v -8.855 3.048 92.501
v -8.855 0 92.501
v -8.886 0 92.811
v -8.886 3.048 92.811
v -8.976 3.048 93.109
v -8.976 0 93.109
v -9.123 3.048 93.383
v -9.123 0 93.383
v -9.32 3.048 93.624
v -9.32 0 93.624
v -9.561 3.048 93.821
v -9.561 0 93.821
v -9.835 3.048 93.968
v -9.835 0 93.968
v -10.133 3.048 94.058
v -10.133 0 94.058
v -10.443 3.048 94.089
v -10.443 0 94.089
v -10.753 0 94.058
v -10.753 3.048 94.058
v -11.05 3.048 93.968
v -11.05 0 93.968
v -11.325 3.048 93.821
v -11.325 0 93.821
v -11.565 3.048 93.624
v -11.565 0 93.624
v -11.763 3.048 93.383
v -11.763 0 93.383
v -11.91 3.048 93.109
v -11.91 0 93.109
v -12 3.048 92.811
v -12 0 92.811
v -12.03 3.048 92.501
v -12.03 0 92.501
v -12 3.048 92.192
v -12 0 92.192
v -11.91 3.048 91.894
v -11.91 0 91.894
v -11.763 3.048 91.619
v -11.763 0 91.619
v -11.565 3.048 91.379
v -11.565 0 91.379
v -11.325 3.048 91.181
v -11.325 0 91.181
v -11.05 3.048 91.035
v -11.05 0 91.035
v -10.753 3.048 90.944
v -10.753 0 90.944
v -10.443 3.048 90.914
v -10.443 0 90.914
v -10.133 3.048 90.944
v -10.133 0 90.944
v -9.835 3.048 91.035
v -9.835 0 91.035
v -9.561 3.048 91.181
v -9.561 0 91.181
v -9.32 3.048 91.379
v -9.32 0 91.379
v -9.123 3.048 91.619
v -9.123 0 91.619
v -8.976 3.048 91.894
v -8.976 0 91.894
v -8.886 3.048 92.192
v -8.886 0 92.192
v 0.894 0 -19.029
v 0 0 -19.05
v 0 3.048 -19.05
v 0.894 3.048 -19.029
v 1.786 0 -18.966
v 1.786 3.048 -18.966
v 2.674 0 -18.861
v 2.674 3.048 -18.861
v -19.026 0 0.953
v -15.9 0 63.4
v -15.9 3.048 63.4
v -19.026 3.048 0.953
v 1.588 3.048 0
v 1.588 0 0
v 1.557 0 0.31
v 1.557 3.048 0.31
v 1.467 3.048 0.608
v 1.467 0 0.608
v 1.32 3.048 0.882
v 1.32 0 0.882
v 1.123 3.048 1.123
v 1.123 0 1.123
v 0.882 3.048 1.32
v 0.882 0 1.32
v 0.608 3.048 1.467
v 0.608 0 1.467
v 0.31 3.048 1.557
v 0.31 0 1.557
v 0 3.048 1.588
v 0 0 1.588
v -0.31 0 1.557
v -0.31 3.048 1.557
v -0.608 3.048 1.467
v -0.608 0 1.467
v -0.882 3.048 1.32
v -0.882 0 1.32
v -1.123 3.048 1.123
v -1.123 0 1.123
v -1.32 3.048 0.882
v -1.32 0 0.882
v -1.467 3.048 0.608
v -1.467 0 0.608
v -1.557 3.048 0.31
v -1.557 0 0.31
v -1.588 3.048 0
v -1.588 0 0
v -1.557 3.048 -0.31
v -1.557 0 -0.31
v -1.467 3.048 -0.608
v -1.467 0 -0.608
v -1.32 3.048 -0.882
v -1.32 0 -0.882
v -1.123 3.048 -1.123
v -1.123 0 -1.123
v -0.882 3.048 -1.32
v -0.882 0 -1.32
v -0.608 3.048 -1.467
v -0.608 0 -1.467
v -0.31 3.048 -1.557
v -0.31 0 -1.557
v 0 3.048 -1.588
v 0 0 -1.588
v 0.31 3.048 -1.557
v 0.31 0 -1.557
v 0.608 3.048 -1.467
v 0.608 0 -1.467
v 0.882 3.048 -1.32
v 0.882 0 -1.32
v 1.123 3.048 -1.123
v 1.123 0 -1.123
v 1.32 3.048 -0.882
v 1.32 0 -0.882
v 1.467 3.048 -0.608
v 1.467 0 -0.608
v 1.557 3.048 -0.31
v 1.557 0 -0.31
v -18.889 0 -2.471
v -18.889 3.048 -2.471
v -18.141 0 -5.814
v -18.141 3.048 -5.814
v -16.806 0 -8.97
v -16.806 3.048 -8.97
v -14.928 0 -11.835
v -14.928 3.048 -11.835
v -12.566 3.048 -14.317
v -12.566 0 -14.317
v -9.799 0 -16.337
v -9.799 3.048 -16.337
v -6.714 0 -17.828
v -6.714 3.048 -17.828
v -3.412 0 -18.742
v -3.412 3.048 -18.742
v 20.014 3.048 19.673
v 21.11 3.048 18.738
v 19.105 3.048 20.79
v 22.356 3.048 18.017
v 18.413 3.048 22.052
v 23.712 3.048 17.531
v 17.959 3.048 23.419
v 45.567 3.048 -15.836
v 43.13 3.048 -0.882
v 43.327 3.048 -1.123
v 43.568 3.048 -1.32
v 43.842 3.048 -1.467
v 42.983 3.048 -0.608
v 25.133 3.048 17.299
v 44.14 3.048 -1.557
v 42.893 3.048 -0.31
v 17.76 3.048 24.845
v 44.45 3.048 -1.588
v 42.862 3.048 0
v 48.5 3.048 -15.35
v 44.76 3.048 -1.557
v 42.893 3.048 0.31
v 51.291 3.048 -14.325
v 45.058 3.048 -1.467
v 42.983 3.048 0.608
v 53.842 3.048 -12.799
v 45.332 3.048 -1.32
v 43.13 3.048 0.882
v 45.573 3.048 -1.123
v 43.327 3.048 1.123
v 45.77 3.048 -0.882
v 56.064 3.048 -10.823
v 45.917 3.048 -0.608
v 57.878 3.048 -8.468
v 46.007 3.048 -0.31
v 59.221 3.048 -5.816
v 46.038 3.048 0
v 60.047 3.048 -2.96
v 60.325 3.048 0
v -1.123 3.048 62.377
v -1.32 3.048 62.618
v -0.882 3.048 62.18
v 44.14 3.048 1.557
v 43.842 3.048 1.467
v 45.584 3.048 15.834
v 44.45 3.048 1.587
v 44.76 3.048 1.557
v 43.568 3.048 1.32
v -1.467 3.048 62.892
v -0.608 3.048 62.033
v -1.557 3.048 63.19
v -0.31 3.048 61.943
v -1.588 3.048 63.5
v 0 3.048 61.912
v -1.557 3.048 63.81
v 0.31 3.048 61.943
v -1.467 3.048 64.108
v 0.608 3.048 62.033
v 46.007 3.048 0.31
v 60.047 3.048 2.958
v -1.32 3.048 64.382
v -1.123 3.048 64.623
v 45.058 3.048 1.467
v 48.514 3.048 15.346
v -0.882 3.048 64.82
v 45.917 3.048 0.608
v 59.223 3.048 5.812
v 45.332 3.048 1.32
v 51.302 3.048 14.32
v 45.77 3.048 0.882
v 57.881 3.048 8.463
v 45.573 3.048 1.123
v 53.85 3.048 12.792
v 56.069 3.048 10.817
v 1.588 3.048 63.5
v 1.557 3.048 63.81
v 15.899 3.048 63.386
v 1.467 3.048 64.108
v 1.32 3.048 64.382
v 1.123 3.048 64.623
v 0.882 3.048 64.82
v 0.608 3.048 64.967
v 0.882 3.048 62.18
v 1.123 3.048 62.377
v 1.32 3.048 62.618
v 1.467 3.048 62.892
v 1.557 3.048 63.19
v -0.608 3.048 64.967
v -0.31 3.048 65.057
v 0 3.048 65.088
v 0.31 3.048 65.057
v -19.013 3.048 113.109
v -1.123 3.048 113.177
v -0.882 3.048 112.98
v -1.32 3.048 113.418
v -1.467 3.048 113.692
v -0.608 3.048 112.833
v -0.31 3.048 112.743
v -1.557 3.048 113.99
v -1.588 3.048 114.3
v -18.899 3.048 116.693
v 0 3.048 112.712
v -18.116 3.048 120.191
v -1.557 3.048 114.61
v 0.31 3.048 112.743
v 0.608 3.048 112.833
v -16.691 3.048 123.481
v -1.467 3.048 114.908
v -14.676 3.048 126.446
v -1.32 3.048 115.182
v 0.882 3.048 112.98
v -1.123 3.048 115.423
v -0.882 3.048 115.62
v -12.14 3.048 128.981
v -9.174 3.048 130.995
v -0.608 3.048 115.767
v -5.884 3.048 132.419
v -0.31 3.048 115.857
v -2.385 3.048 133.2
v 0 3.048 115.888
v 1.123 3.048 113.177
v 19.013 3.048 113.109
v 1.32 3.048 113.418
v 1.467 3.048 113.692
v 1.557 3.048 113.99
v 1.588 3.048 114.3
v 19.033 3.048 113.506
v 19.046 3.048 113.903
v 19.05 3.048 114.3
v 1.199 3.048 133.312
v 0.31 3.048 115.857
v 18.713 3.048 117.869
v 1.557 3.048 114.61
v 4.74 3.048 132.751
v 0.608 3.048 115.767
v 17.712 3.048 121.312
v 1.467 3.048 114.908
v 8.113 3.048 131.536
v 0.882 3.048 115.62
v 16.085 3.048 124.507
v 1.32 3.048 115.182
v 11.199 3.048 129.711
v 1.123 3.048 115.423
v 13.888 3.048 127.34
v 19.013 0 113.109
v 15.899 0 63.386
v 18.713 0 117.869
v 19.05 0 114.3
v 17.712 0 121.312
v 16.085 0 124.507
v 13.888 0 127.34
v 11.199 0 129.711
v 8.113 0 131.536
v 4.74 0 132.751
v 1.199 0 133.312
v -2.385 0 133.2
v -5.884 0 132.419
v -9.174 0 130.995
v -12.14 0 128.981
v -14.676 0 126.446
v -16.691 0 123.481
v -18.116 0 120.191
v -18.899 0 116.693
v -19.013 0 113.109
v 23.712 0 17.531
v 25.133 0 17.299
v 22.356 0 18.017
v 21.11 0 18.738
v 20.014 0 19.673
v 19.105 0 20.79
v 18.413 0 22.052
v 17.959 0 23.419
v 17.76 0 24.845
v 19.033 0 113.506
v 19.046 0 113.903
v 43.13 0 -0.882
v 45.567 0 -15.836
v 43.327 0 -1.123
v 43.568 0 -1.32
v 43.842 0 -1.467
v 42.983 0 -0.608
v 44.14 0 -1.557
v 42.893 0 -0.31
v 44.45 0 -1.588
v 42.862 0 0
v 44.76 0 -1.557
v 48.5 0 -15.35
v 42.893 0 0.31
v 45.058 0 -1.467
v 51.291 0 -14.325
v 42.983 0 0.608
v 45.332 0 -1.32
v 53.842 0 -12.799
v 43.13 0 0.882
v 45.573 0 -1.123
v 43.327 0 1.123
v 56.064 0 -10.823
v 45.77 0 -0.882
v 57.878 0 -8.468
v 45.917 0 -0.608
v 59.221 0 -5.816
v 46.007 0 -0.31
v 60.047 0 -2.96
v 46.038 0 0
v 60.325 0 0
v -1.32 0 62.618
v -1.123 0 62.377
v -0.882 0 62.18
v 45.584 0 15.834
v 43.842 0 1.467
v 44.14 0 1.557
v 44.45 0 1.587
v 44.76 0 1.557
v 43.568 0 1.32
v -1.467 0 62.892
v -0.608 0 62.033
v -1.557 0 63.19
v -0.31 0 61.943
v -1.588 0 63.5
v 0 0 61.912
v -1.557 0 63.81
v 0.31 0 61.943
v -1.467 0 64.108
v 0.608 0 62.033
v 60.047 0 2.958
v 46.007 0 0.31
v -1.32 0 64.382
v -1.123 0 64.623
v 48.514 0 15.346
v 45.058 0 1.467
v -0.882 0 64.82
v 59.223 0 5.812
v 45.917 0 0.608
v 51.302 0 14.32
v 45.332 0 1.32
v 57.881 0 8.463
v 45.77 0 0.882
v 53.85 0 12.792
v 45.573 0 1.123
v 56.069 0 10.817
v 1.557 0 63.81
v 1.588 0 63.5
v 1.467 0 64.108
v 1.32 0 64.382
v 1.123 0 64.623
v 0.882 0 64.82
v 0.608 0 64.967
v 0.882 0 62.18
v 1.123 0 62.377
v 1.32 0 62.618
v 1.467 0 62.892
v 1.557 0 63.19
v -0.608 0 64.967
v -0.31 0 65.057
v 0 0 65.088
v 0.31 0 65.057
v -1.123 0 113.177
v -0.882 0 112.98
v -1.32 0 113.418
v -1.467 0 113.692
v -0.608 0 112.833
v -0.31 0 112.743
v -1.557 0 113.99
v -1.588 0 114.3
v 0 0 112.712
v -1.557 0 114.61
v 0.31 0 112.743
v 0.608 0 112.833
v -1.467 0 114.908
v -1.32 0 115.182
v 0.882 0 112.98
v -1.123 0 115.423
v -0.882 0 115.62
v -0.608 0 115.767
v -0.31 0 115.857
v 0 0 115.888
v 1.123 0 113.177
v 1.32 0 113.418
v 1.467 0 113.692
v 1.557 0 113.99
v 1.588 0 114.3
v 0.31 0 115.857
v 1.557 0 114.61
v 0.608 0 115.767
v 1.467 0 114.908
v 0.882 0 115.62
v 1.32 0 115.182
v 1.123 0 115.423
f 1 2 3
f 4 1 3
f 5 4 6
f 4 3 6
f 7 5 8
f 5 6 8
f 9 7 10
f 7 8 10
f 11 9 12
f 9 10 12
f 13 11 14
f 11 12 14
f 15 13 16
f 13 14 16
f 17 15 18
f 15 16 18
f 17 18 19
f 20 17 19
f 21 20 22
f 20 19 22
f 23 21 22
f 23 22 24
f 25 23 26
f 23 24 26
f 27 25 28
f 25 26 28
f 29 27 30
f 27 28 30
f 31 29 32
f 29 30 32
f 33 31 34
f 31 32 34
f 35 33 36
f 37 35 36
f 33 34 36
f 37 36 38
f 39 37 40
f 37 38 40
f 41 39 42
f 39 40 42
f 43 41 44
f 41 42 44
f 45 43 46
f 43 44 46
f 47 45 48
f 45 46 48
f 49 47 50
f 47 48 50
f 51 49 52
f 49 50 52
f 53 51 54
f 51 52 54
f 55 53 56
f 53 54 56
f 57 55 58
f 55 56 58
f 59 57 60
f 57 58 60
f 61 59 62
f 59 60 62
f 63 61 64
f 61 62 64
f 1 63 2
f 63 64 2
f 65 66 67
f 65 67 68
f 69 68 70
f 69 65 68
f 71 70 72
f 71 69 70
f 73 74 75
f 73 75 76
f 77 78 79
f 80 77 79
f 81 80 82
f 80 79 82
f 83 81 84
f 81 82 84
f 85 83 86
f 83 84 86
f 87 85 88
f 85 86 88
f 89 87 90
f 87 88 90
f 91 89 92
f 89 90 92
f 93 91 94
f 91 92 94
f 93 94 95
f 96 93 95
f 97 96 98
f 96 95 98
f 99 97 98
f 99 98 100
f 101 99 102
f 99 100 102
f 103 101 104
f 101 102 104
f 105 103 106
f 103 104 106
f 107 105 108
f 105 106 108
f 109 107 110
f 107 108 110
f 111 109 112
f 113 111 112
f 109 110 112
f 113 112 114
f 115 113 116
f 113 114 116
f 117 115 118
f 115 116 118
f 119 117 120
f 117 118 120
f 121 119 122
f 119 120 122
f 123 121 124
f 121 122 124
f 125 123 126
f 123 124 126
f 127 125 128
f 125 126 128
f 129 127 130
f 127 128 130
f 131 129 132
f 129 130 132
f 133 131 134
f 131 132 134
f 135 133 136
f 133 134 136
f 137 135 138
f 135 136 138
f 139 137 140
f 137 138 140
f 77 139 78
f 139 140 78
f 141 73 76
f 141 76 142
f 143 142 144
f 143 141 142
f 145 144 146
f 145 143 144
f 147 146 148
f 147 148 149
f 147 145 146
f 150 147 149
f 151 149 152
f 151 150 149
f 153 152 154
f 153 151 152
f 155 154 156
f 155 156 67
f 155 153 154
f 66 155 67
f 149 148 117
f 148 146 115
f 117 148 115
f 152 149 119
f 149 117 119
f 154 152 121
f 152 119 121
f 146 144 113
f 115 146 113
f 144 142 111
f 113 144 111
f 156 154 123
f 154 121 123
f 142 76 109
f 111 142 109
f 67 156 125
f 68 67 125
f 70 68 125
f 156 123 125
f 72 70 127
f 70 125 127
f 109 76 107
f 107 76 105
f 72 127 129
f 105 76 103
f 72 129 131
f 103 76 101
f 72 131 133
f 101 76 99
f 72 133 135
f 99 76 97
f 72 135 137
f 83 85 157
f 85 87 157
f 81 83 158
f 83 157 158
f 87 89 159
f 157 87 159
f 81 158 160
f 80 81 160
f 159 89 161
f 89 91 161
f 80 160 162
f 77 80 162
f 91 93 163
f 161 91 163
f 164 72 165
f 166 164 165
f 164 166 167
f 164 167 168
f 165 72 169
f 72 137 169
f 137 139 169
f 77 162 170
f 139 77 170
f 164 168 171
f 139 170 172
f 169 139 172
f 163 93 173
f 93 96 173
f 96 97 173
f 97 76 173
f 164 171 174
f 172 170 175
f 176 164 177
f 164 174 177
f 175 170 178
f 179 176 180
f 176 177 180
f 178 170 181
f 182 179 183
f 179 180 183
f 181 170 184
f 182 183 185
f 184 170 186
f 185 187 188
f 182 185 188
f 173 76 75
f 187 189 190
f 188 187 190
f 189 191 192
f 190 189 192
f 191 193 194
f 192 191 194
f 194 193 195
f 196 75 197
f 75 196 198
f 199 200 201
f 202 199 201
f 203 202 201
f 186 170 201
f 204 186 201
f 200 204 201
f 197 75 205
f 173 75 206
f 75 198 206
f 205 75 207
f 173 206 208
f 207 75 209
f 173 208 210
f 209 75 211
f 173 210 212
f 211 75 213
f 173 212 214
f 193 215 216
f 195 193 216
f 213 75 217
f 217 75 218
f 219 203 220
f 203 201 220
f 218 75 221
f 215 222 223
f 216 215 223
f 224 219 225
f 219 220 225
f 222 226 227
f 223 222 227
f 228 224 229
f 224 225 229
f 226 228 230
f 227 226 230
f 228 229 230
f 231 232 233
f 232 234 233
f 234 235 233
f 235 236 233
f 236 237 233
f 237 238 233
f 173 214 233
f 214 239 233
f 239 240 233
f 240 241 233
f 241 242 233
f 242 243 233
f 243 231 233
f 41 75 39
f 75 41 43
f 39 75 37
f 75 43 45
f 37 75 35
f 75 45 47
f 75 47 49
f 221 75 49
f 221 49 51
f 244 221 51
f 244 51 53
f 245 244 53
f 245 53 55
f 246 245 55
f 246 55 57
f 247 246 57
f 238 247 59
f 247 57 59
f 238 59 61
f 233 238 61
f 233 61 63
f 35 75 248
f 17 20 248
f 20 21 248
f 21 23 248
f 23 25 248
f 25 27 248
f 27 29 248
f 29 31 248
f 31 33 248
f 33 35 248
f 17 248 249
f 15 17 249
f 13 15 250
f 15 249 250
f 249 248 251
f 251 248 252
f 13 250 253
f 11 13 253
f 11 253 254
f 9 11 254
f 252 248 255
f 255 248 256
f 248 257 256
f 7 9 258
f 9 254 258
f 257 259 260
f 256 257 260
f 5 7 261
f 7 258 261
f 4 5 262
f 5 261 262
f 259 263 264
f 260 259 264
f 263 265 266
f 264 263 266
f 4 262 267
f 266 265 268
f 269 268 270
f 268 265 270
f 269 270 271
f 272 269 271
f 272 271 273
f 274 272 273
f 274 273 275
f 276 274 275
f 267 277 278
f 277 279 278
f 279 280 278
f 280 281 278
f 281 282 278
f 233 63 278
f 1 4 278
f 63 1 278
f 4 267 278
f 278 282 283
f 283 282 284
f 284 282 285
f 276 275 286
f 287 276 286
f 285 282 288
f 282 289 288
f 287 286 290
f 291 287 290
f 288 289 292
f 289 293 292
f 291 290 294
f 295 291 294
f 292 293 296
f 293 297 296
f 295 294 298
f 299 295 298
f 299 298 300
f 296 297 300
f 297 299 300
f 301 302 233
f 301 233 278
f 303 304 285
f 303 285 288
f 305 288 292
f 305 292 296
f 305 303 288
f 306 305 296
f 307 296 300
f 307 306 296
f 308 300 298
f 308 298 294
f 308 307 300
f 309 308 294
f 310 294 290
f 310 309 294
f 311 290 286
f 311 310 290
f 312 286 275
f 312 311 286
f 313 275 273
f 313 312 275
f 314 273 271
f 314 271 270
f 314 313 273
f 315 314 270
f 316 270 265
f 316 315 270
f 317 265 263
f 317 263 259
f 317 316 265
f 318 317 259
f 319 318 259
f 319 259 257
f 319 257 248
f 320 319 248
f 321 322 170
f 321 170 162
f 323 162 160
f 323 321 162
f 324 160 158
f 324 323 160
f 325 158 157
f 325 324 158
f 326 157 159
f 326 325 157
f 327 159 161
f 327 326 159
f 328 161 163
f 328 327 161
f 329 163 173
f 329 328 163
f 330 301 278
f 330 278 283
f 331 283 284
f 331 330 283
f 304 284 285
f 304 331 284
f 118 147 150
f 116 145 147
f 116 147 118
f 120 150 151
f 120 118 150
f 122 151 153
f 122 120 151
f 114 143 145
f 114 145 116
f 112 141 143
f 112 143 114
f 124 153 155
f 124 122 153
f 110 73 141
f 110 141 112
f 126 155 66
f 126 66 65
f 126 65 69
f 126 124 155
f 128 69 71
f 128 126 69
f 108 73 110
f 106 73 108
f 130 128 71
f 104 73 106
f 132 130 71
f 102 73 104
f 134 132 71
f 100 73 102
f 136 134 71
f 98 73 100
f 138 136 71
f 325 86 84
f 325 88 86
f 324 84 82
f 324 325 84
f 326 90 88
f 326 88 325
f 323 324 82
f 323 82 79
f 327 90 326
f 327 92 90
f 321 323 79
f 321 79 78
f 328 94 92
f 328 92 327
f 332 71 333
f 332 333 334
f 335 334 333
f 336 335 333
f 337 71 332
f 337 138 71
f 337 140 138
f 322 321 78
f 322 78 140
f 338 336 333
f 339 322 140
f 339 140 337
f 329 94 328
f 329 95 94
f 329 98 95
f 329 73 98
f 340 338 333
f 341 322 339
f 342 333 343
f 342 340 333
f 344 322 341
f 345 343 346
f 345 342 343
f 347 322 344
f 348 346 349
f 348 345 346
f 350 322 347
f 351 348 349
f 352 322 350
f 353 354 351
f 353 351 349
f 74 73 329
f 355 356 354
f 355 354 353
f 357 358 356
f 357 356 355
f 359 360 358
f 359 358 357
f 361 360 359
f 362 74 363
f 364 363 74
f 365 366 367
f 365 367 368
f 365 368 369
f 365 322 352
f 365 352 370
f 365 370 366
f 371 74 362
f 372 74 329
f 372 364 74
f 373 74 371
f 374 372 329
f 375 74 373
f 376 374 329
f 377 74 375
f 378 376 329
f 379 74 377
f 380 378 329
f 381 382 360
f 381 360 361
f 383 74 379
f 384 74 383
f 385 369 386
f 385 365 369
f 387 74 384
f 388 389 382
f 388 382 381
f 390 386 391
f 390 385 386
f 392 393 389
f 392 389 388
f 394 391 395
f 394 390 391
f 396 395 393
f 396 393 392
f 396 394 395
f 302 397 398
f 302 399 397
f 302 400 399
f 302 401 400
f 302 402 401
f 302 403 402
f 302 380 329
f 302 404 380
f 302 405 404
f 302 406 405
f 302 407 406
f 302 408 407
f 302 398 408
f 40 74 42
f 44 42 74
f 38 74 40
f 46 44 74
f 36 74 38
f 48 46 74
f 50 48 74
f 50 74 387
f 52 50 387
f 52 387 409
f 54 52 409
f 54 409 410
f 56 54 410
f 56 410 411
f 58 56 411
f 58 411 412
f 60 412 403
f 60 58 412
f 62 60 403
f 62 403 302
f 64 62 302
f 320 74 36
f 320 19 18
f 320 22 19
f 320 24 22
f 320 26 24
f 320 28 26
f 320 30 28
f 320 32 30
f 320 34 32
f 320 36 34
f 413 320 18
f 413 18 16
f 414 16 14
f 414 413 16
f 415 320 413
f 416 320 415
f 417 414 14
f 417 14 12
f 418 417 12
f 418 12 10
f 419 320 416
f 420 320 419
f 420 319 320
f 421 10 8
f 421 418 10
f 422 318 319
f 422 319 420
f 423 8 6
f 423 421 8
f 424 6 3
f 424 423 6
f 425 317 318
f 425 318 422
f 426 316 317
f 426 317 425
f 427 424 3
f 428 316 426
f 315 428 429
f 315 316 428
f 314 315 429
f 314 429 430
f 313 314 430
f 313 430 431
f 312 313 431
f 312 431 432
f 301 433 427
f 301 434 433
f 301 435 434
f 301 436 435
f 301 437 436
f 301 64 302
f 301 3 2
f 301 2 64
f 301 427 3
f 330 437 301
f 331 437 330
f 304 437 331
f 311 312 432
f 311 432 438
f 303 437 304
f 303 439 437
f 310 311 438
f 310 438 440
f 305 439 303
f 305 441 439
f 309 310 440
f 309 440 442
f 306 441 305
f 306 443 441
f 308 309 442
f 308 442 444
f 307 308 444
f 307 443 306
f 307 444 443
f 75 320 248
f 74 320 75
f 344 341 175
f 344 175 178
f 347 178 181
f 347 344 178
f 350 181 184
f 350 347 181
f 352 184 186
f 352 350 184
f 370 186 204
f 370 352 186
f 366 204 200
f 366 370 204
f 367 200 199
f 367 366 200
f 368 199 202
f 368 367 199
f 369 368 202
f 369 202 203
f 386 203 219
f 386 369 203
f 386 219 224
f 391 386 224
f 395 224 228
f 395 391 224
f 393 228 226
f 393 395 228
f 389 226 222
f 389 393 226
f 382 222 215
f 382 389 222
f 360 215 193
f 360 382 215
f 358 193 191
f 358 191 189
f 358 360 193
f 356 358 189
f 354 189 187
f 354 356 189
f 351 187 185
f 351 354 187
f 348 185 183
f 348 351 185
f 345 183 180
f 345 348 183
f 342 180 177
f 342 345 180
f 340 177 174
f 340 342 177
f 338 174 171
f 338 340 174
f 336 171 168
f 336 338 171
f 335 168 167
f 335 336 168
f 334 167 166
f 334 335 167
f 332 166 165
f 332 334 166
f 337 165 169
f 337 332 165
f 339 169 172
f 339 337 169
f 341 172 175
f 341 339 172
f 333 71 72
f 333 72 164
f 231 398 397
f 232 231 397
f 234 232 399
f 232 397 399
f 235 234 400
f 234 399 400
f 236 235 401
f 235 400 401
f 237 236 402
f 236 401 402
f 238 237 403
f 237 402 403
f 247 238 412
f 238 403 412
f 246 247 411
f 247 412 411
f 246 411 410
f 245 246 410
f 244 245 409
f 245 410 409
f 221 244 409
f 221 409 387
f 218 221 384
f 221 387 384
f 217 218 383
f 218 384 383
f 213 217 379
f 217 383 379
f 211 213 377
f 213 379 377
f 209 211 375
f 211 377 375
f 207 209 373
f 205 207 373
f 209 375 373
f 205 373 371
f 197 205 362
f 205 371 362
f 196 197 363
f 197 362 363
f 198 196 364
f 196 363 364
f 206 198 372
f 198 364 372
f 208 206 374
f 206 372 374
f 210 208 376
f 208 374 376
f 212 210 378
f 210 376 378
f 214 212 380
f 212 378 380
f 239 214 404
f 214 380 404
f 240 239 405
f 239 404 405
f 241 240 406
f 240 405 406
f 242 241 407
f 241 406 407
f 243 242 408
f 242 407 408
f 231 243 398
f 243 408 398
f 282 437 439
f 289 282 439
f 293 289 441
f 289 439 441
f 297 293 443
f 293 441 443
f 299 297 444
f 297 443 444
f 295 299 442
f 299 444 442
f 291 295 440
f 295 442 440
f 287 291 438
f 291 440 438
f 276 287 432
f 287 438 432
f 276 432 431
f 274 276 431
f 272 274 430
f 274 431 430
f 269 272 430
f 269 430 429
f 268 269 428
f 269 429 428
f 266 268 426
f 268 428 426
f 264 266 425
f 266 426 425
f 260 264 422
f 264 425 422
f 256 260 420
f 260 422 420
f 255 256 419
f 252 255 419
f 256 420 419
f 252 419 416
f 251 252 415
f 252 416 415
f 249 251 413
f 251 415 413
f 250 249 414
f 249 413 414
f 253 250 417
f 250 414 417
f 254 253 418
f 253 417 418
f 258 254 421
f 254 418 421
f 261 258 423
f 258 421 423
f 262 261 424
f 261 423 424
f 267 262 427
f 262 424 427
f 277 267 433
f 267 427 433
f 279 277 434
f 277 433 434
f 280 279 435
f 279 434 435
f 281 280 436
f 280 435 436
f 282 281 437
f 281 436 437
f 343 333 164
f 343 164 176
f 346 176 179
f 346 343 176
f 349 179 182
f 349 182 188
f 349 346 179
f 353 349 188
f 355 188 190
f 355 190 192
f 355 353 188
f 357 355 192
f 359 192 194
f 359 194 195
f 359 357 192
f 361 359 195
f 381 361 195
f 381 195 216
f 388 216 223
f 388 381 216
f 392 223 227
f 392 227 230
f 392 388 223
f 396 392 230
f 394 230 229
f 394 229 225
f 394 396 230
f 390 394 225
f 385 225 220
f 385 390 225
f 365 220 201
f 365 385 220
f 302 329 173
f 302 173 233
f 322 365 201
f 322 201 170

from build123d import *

# Parameters (mm, degrees)
F0_R     = 1.5875
F1_DEPTH = 3.048


with BuildPart() as f1:
    # F0 (on Front) → F1 (new body)
    with BuildSketch(Plane.XZ):
        with BuildLine():
            ThreePointArc((2.6743082177, -18.8613513714), (14.3848543883, -12.4891338461), (19.05, 0))
            ThreePointArc((19.05, 0), (0.4763992031, 19.0440422127), (-19.0261725774, 0.9525004235))
            ThreePointArc((-19.0261725774, 0.9525004235), (-13.8030364969, -13.1293062827), (0, -19.05))
            Line((0, -19.05), (2.6743082177, -18.8613513714))
        make_face()
        Circle(F0_R, mode=Mode.SUBTRACT)
        with BuildLine():
            ThreePointArc((-19.0261725774, 0.9525004235), (0.4763992031, 19.0440422127), (19.05, 0))
            Line((19.05, 0), (28.575, 0))
            ThreePointArc((28.575, 0), (33.6330108411, 11.6193102435), (45.5839285714, 15.8344507639))
            Line((45.5839285714, 15.8344507639), (25.1330658708, 17.2989674606))
            ThreePointArc((25.1330658708, 17.2989674606), (20.0143532381, 19.6729228807), (17.7599894, 24.8454200569))
            Line((17.7599894, 24.8454200569), (15.8989821959, 63.3863857925))
            Line((15.8989821959, 63.3863857925), (19.0127565626, 113.109375))
            ThreePointArc((19.0127565626, 113.109375), (0, 95.25), (-19.0127565626, 113.109375))
            Line((-19.0127565626, 113.109375), (-15.8998639519, 63.4004663068))
            Line((-15.8998639519, 63.4004663068), (-19.0261725774, 0.9525004235))
        make_face()
        with Locations((0, 63.5)):
            Circle(F0_R, mode=Mode.SUBTRACT)
        with Locations((-10.4428892955, 92.5013944507)):
            Circle(F0_R, mode=Mode.SUBTRACT)
        with BuildLine():
            Line((28.575, 0), (19.05, 0))
            ThreePointArc((19.05, 0), (14.3848543883, -12.4891338461), (2.6743082177, -18.8613513714))
            Line((2.6743082177, -18.8613513714), (45.5670640422, -15.8356494318))
            ThreePointArc((45.5670640422, -15.8356494318), (33.6268250192, -11.6135484816), (28.575, 0))
        make_face()
        with BuildLine():
            ThreePointArc((45.5839285714, 15.8344507639), (33.6330108411, 11.6193102435), (28.575, 0))
            ThreePointArc((28.575, 0), (33.6268250192, -11.6135484816), (45.5670640422, -15.8356494318))
            ThreePointArc((45.5670640422, -15.8356494318), (56.0635484816, -10.8231749808), (60.325, 0))
            ThreePointArc((60.325, 0), (56.0693102435, 10.8169891589), (45.5839285714, 15.8344507639))
        make_face()
        with BuildLine():
            ThreePointArc((46.0375, 0), (44.45, -1.5875), (42.8625, 0))
            ThreePointArc((42.8625, 0), (44.45, 1.5875), (46.0375, 0))
        make_face(mode=Mode.SUBTRACT)
        with BuildLine():
            ThreePointArc((0, -19.05), (1.3404768506, -19.0027793181), (2.6743082177, -18.8613513714))
            Line((2.6743082177, -18.8613513714), (0, -19.05))
        make_face()
        with BuildLine():
            ThreePointArc((19.05, 114.3), (-0.5956036778, 133.3406868642), (-19.0127565626, 113.109375))
            ThreePointArc((-19.0127565626, 113.109375), (0, 95.25), (19.0127565626, 113.109375))
            ThreePointArc((19.0127565626, 113.109375), (19.0406868642, 113.7043963222), (19.05, 114.3))
        make_face()
        with Locations((0, 114.3)):
            Circle(F0_R, mode=Mode.SUBTRACT)
    extrude(amount=-F1_DEPTH)


solid = f1.part
